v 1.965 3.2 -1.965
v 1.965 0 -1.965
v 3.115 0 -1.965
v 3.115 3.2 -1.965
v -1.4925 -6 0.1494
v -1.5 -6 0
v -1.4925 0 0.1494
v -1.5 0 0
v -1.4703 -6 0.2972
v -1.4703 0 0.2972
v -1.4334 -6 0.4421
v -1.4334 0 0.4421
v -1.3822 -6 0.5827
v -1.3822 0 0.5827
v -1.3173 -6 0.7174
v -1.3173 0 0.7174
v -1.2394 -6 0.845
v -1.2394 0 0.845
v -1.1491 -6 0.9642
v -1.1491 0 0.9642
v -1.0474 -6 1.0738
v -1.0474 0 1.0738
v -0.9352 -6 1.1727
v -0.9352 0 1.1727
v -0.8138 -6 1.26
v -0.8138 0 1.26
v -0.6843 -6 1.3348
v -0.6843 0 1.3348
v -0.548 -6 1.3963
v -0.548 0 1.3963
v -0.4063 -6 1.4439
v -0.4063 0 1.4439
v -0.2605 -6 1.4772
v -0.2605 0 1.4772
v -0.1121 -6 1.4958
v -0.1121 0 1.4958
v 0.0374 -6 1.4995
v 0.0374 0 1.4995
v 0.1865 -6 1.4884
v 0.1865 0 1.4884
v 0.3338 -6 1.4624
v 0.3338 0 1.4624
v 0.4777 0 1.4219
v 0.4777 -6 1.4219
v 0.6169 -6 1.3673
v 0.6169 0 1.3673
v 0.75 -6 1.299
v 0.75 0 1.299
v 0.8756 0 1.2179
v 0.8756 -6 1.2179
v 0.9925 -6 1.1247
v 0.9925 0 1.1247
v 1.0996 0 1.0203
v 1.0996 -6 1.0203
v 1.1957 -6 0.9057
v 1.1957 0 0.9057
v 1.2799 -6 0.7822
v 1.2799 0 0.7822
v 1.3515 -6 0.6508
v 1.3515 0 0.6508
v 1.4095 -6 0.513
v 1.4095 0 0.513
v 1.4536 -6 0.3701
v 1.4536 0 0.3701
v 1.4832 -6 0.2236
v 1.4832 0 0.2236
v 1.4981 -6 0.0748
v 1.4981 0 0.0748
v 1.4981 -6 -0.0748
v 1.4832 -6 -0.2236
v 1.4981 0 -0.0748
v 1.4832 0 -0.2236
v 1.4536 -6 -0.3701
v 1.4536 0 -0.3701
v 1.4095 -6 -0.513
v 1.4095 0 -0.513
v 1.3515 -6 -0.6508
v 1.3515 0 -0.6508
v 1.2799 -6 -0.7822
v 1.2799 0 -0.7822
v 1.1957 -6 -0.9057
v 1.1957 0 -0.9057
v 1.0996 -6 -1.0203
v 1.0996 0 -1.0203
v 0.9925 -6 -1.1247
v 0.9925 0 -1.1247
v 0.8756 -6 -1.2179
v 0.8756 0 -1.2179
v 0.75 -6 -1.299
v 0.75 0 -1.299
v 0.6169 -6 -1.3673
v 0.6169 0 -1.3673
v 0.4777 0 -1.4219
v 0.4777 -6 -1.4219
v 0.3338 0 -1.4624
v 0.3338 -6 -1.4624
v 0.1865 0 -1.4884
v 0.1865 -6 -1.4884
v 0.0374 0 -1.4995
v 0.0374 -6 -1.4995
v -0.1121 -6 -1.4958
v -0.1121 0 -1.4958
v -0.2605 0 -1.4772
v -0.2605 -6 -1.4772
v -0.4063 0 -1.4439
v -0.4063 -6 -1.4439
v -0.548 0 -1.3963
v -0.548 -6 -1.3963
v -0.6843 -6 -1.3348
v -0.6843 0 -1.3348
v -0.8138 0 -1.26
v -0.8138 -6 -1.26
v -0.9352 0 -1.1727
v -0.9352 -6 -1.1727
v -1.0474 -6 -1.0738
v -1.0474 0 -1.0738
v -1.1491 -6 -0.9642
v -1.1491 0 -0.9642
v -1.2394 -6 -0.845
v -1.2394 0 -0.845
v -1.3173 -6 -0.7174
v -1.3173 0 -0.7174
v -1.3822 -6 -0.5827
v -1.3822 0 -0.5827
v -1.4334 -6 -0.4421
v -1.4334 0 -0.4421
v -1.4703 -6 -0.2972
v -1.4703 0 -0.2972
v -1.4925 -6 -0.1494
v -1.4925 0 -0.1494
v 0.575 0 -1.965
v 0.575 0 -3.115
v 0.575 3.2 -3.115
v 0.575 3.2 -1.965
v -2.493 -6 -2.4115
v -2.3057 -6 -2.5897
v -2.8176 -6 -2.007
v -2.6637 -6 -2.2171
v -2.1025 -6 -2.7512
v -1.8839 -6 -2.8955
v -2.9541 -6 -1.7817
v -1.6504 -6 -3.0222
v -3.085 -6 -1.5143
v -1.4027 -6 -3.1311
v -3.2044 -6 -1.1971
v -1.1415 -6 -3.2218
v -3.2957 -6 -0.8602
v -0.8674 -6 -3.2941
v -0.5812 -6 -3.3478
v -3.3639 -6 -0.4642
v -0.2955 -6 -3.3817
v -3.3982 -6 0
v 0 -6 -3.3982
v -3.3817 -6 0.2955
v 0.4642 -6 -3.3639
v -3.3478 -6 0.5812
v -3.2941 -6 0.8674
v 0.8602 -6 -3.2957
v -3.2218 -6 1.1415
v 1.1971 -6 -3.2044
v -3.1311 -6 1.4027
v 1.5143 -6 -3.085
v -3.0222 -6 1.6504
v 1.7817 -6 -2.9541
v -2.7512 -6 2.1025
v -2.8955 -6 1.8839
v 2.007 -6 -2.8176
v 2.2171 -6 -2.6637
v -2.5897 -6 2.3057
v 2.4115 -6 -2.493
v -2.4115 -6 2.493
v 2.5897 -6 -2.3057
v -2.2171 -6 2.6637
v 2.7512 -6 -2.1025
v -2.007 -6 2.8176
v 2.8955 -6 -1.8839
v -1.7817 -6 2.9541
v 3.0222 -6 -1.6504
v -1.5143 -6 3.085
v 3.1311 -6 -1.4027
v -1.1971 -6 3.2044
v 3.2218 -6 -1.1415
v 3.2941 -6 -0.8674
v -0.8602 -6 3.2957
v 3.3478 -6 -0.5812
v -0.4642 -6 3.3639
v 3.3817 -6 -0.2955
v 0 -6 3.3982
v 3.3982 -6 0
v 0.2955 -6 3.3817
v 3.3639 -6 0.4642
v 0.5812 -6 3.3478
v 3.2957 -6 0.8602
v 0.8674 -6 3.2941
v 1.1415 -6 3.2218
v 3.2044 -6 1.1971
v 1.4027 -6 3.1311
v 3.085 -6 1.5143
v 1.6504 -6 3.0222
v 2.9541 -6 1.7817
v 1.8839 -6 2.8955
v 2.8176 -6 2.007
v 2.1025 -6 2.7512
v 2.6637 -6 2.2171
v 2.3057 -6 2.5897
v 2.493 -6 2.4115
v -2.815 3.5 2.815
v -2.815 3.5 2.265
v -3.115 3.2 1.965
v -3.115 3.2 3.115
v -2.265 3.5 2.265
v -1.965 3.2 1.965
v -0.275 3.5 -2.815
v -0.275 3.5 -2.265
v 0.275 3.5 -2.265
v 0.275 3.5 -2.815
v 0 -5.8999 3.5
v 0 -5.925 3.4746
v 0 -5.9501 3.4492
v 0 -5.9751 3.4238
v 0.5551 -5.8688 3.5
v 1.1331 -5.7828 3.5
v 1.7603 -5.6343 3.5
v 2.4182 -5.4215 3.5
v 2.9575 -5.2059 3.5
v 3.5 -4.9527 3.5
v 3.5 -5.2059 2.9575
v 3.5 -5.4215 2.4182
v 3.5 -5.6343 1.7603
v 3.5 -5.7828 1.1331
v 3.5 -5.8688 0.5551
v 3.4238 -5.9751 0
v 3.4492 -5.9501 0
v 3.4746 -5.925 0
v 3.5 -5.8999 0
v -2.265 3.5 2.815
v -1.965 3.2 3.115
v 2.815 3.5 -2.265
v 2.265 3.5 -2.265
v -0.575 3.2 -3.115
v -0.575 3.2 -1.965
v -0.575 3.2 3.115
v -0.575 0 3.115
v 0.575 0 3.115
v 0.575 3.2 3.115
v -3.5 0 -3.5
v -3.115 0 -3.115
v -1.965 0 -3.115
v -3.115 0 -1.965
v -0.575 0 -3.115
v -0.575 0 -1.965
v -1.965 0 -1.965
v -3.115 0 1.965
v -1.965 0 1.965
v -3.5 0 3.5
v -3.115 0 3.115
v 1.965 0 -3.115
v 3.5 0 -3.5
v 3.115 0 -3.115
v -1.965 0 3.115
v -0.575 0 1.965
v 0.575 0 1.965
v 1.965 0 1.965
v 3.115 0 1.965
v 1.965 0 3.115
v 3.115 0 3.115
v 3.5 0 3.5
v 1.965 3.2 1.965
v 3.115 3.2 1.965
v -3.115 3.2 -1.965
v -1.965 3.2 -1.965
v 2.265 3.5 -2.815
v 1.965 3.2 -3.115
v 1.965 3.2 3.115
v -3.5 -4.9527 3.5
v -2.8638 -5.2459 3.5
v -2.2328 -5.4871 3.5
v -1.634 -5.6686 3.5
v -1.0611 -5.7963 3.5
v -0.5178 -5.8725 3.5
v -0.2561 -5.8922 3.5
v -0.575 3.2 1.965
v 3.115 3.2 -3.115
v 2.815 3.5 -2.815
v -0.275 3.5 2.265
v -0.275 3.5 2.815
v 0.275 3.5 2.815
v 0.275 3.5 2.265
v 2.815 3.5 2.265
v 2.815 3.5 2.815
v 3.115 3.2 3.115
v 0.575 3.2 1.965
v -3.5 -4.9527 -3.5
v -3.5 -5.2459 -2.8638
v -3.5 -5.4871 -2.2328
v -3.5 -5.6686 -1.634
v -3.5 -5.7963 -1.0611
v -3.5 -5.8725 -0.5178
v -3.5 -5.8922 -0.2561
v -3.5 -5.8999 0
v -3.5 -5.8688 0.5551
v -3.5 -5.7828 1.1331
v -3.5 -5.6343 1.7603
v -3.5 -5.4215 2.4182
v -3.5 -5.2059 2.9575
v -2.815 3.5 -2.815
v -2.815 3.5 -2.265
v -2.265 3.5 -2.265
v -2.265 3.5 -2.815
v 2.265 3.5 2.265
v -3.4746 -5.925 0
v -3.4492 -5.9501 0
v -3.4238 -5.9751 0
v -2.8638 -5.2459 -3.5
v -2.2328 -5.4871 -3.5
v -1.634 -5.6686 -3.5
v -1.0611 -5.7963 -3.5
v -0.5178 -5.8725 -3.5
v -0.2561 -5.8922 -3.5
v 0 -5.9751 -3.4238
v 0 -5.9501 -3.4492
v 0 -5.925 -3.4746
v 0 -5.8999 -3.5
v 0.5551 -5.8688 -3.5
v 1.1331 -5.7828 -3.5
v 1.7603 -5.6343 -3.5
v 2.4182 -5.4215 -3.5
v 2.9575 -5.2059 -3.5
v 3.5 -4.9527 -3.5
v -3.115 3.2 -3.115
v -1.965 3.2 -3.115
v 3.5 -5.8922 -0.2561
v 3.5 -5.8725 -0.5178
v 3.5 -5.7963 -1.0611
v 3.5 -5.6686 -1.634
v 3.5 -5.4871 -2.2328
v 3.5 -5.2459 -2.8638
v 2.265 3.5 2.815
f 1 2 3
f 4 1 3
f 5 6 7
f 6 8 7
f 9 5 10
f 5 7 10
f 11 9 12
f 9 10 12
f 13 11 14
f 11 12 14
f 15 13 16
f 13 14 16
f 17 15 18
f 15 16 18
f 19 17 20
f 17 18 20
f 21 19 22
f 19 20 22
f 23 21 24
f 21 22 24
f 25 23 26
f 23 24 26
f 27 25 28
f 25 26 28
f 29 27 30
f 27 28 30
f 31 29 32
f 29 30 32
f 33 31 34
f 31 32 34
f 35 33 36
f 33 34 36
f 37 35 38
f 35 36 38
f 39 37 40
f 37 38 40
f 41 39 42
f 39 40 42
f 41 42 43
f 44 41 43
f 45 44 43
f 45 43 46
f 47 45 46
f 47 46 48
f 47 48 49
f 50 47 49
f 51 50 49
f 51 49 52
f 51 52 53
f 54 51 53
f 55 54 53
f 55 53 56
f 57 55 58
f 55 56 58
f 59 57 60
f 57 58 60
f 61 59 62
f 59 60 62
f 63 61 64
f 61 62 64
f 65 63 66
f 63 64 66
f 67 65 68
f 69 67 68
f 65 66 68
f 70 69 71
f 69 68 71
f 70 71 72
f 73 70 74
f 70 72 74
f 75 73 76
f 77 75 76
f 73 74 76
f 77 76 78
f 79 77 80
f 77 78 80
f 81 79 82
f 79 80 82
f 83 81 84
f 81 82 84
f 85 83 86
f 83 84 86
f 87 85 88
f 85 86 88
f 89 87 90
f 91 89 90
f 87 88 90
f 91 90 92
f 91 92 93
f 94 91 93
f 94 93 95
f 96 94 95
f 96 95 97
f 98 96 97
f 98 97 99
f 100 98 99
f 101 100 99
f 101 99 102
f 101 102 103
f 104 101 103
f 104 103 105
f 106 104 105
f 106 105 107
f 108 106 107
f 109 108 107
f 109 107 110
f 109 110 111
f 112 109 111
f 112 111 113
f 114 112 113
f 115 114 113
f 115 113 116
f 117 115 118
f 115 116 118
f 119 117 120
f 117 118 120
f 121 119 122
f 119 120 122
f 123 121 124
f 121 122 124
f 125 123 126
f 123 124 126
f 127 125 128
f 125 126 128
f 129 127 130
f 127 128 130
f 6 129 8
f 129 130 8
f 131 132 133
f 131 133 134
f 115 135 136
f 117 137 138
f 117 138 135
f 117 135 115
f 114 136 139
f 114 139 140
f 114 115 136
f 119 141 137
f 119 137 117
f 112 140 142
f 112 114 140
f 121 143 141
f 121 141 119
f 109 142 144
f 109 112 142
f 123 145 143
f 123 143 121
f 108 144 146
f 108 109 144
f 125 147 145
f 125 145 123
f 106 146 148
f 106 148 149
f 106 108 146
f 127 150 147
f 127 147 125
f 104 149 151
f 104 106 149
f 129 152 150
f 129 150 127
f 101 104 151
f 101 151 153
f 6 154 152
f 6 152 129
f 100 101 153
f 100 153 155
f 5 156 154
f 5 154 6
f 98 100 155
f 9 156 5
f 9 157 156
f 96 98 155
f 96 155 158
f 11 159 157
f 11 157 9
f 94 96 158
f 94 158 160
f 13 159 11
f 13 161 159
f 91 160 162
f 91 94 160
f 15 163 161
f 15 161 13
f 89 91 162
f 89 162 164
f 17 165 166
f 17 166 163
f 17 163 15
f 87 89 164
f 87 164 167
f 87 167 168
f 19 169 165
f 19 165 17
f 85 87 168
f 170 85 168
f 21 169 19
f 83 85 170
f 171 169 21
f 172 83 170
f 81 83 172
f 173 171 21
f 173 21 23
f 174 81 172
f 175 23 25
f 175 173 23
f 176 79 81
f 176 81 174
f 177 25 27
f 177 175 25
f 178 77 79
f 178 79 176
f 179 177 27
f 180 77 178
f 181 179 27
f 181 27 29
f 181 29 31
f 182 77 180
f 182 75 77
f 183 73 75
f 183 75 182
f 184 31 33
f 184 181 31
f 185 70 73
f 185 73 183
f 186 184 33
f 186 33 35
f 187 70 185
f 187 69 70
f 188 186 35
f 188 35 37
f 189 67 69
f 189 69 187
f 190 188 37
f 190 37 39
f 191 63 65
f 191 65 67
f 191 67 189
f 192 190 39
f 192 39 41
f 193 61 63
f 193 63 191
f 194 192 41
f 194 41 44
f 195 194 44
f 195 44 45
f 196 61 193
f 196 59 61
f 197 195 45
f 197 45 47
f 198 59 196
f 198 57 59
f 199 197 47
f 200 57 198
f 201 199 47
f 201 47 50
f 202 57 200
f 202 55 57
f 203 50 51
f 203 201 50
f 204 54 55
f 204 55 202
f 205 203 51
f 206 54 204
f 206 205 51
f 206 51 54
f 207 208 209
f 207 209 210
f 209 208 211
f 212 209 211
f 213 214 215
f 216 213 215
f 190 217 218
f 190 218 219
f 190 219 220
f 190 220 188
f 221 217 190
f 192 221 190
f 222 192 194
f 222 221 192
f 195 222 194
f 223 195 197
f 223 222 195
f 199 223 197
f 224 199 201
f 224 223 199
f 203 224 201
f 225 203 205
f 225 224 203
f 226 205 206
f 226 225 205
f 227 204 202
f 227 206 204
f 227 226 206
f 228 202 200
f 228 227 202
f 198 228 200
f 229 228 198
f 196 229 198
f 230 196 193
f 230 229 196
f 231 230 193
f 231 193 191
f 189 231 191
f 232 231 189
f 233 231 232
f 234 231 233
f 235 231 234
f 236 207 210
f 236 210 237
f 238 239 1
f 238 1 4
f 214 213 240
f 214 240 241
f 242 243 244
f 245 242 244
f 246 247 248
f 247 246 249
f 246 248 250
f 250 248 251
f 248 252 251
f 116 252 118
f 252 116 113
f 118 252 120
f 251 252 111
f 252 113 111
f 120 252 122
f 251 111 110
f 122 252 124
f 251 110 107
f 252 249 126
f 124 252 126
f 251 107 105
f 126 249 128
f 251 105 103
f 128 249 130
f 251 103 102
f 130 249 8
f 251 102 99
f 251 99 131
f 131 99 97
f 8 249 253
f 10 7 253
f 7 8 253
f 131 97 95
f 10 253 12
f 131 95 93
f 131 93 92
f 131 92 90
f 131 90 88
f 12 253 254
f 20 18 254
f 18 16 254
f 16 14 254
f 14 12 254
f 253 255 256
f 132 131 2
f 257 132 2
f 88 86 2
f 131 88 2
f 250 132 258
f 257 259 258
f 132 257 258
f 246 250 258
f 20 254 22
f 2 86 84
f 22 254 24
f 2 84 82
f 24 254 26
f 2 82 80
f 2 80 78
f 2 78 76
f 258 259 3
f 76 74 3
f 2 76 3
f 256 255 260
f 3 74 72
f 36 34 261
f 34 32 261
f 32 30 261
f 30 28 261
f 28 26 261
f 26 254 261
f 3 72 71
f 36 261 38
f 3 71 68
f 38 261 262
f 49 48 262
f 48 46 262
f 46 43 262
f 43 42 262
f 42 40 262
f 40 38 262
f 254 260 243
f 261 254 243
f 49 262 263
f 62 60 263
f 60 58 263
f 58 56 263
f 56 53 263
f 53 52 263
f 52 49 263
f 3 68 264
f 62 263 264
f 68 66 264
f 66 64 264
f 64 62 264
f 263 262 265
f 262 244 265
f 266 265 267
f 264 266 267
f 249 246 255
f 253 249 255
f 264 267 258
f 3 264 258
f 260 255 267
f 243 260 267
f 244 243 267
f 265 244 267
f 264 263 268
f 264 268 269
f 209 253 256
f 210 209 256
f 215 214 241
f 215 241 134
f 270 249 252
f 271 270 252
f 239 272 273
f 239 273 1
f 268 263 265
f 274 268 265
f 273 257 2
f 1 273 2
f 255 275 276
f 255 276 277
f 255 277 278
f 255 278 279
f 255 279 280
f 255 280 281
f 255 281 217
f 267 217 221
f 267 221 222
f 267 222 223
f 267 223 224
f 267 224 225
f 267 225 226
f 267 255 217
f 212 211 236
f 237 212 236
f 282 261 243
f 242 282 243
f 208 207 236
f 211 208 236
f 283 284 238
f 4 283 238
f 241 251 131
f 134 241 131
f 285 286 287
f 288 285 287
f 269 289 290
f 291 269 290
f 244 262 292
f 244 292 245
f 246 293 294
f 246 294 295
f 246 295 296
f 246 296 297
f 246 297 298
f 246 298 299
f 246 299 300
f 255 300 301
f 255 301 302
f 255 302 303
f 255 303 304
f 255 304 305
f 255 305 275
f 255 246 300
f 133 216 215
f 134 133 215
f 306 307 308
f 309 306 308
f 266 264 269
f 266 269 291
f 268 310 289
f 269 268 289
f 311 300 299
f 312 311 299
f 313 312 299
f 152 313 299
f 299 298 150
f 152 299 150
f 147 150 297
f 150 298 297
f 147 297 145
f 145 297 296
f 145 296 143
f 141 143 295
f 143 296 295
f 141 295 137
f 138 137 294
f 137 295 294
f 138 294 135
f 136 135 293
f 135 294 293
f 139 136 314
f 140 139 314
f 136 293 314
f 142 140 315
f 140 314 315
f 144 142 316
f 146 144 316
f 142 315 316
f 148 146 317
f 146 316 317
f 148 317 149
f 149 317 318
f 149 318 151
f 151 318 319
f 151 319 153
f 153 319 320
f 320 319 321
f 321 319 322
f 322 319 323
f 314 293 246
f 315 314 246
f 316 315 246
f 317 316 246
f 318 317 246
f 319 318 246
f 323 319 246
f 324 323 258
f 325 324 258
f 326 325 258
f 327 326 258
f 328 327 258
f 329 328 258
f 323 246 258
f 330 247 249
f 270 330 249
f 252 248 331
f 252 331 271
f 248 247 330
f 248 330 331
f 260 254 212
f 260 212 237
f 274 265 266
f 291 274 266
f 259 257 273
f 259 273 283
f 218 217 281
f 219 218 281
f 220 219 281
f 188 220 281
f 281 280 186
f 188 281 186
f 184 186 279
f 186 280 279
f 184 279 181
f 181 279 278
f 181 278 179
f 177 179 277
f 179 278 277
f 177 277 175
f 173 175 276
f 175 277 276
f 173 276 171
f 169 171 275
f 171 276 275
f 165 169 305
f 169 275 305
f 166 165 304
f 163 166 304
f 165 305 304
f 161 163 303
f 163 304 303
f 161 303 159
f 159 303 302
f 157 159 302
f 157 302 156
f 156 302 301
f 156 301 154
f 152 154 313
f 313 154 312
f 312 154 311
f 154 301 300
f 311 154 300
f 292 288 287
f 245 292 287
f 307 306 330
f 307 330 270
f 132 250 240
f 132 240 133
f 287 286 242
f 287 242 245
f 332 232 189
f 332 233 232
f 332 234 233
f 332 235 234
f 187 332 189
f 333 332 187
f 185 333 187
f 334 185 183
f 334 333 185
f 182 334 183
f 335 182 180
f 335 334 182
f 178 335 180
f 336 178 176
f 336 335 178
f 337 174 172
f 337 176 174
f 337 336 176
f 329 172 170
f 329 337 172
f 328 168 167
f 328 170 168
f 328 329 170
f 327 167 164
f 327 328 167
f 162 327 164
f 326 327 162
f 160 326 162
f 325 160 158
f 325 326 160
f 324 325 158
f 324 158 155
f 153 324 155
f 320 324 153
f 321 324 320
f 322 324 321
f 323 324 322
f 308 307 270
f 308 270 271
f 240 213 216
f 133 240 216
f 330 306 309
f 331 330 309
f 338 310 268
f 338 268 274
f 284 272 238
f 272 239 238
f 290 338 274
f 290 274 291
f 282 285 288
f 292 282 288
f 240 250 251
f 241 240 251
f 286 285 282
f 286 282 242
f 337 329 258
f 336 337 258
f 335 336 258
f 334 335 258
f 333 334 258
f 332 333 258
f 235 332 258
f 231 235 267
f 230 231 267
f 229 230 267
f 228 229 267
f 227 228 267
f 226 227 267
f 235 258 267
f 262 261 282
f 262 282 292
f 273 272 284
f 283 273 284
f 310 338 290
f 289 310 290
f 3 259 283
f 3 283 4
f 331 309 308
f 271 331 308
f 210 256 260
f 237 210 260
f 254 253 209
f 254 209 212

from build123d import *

# Parameters (mm, degrees)
F0_W        = 7
F0_H        = 7
F0_W_2      = 1.15
F0_H_2      = 1.15
F1_DEPTH    = 6
F2_SIZE     = 0.1
F3_T1_DEPTH = 14.6069618105
F3_T3_DEPTH = 14.6069618105
F3_T5_DEPTH = 14.6069618105
F3_T7_DEPTH = 14.6069618105
F6_D        = 3
F6_DEPTH    = 6
F6_TIP      = 0.9012909285
F8_DEPTH    = 3.5
F9_SIZE     = 0.3


# Not quite as in the source:
# - a fillet or chamfer that OpenCascade refuses, or shapes differently, is made with other operations: its cross-section is extruded or revolved along the edge and cut away or added


with BuildPart() as f1:
    # F0 (on Front) → F1 (new body)
    with BuildSketch(Plane.XZ):
        Rectangle(F0_W, F0_H)
        with Locations((-2.54, -2.54)):
            Rectangle(F0_W_2, F0_H_2, mode=Mode.SUBTRACT)
        with Locations((0, -2.54)):
            Rectangle(F0_W_2, F0_H_2, mode=Mode.SUBTRACT)
        with Locations((2.54, -2.54)):
            Rectangle(F0_W_2, F0_H_2, mode=Mode.SUBTRACT)
        with Locations((-2.54, 2.54)):
            Rectangle(F0_W_2, F0_H_2, mode=Mode.SUBTRACT)
        with Locations((0, 2.54)):
            Rectangle(F0_W_2, F0_H_2, mode=Mode.SUBTRACT)
        with Locations((2.54, 2.54)):
            Rectangle(F0_W_2, F0_H_2, mode=Mode.SUBTRACT)
        with Locations((-2.54, -2.54)):
            Rectangle(F0_W_2, F0_H_2)
        with Locations((0, -2.54)):
            Rectangle(F0_W_2, F0_H_2)
        with Locations((0, 2.54)):
            Rectangle(F0_W_2, F0_H_2)
        with Locations((-2.54, 2.54)):
            Rectangle(F0_W_2, F0_H_2)
        with Locations((2.54, 2.54)):
            Rectangle(F0_W_2, F0_H_2)
        with Locations((2.54, -2.54)):
            Rectangle(F0_W_2, F0_H_2)
    extrude(amount=F1_DEPTH)

    # F2
    f2_edges = [f1.edges().sort_by_distance(p)[0] for p in [
        (3.5, -6, 0),
        (0, -6, 3.5),
        (-3.5, -6, 0),
        (0, -6, -3.5),
    ]]
    chamfer(f2_edges, length=F2_SIZE)

    # F3: fillet of radius 5 on 4 edges, made by hand

    # F3_s2 → F3_t1 (cut)
    with BuildSketch(Plane(origin=(4.5333333333, 4.5333333333, 4.5333333333), x_dir=(0.7071067812, -0.7071067812, 0), z_dir=(-0.5773502692, -0.5773502692, -0.5773502692))):
        with BuildLine():
            ThreePointArc((4.1468037432, 5.2809096033), (5.9769307621, 3.4507825844), (6.6468037432, 0.9507825844))
            Line((6.6468037432, 0.9507825844), (6.6468037432, 3.8375339304))
            Line((6.6468037432, 3.8375339304), (4.1468037432, 5.2809096033))
        make_face()
    extrude(amount=F3_T1_DEPTH, mode=Mode.SUBTRACT)

    # F3_s4 → F3_t3 (cut)
    with BuildSketch(Plane(origin=(-4.5333333333, 4.5333333333, 4.5333333333), x_dir=(0.7071067812, 0.7071067812, 0), z_dir=(0.5773502692, -0.5773502692, -0.5773502692))):
        with BuildLine():
            ThreePointArc((-4.1468037432, 5.2809096033), (-5.9769307621, 3.4507825844), (-6.6468037432, 0.9507825844))
            Line((-6.6468037432, 0.9507825844), (-6.6468037432, 3.8375339304))
            Line((-6.6468037432, 3.8375339304), (-4.1468037432, 5.2809096033))
        make_face()
    extrude(amount=F3_T3_DEPTH, mode=Mode.SUBTRACT)

    # F3_s6 → F3_t5 (cut)
    with BuildSketch(Plane(origin=(4.5333333333, 4.5333333333, -4.5333333333), x_dir=(0.7071067812, -0.7071067812, 0), z_dir=(-0.5773502692, -0.5773502692, 0.5773502692))):
        with BuildLine():
            ThreePointArc((6.6468037432, -0.9507825844), (5.9769307621, -3.4507825844), (4.1468037432, -5.2809096033))
            Line((4.1468037432, -5.2809096033), (6.6468037432, -3.8375339304))
            Line((6.6468037432, -3.8375339304), (6.6468037432, -0.9507825844))
        make_face()
    extrude(amount=F3_T5_DEPTH, mode=Mode.SUBTRACT)

    # F3_s8 → F3_t7 (cut)
    with BuildSketch(Plane(origin=(-4.5333333333, 4.5333333333, -4.5333333333), x_dir=(0.7071067812, 0.7071067812, 0), z_dir=(0.5773502692, -0.5773502692, 0.5773502692))):
        with BuildLine():
            ThreePointArc((-6.6468037432, -0.9507825844), (-5.9769307621, -3.4507825844), (-4.1468037432, -5.2809096033))
            Line((-4.1468037432, -5.2809096033), (-6.6468037432, -3.8375339304))
            Line((-6.6468037432, -3.8375339304), (-6.6468037432, -0.9507825844))
        make_face()
    extrude(amount=F3_T7_DEPTH, mode=Mode.SUBTRACT)

    # F6
    with Locations(Plane.XZ.offset(6)):
        with Locations((0, 0)):
            Hole(F6_D / 2, depth=F6_DEPTH)
            with Locations((0, 0, -(F6_DEPTH + F6_TIP / 2))):  # 118° drill point
                Cone(0, F6_D / 2, F6_TIP, mode=Mode.SUBTRACT)

    # F0 (on Front) → F8 (join)
    with BuildSketch(Plane.XZ):
        with Locations((2.54, 2.54)):
            Rectangle(F0_W_2, F0_H_2)
        with Locations((0, 2.54)):
            Rectangle(F0_W_2, F0_H_2)
        with Locations((-2.54, 2.54)):
            Rectangle(F0_W_2, F0_H_2)
        with Locations((-2.54, -2.54)):
            Rectangle(F0_W_2, F0_H_2)
        with Locations((0, -2.54)):
            Rectangle(F0_W_2, F0_H_2)
        with Locations((2.54, -2.54)):
            Rectangle(F0_W_2, F0_H_2)
    extrude(amount=-F8_DEPTH)

    # F9
    f9_edges = [f1.edges().sort_by_distance(p)[0] for p in [
        (2.54, 3.5, -3.115),
        (1.965, 3.5, -2.54),
        (3.115, 3.5, -2.54),
        (2.54, 3.5, -1.965),
        (0.575, 3.5, -2.54),
        (0, 3.5, -3.115),
        (-0.575, 3.5, -2.54),
        (0, 3.5, -1.965),
        (-1.965, 3.5, -2.54),
        (-2.54, 3.5, -1.965),
        (-3.115, 3.5, -2.54),
        (-2.54, 3.5, -3.115),
        (3.115, 3.5, 2.54),
        (2.54, 3.5, 1.965),
        (1.965, 3.5, 2.54),
        (2.54, 3.5, 3.115),
        (0.575, 3.5, 2.54),
        (0, 3.5, 3.115),
        (-0.575, 3.5, 2.54),
        (0, 3.5, 1.965),
        (-1.965, 3.5, 2.54),
        (-2.54, 3.5, 1.965),
        (-3.115, 3.5, 2.54),
        (-2.54, 3.5, 3.115),
    ]]
    chamfer(f9_edges, length=F9_SIZE)


solid = f1.part
